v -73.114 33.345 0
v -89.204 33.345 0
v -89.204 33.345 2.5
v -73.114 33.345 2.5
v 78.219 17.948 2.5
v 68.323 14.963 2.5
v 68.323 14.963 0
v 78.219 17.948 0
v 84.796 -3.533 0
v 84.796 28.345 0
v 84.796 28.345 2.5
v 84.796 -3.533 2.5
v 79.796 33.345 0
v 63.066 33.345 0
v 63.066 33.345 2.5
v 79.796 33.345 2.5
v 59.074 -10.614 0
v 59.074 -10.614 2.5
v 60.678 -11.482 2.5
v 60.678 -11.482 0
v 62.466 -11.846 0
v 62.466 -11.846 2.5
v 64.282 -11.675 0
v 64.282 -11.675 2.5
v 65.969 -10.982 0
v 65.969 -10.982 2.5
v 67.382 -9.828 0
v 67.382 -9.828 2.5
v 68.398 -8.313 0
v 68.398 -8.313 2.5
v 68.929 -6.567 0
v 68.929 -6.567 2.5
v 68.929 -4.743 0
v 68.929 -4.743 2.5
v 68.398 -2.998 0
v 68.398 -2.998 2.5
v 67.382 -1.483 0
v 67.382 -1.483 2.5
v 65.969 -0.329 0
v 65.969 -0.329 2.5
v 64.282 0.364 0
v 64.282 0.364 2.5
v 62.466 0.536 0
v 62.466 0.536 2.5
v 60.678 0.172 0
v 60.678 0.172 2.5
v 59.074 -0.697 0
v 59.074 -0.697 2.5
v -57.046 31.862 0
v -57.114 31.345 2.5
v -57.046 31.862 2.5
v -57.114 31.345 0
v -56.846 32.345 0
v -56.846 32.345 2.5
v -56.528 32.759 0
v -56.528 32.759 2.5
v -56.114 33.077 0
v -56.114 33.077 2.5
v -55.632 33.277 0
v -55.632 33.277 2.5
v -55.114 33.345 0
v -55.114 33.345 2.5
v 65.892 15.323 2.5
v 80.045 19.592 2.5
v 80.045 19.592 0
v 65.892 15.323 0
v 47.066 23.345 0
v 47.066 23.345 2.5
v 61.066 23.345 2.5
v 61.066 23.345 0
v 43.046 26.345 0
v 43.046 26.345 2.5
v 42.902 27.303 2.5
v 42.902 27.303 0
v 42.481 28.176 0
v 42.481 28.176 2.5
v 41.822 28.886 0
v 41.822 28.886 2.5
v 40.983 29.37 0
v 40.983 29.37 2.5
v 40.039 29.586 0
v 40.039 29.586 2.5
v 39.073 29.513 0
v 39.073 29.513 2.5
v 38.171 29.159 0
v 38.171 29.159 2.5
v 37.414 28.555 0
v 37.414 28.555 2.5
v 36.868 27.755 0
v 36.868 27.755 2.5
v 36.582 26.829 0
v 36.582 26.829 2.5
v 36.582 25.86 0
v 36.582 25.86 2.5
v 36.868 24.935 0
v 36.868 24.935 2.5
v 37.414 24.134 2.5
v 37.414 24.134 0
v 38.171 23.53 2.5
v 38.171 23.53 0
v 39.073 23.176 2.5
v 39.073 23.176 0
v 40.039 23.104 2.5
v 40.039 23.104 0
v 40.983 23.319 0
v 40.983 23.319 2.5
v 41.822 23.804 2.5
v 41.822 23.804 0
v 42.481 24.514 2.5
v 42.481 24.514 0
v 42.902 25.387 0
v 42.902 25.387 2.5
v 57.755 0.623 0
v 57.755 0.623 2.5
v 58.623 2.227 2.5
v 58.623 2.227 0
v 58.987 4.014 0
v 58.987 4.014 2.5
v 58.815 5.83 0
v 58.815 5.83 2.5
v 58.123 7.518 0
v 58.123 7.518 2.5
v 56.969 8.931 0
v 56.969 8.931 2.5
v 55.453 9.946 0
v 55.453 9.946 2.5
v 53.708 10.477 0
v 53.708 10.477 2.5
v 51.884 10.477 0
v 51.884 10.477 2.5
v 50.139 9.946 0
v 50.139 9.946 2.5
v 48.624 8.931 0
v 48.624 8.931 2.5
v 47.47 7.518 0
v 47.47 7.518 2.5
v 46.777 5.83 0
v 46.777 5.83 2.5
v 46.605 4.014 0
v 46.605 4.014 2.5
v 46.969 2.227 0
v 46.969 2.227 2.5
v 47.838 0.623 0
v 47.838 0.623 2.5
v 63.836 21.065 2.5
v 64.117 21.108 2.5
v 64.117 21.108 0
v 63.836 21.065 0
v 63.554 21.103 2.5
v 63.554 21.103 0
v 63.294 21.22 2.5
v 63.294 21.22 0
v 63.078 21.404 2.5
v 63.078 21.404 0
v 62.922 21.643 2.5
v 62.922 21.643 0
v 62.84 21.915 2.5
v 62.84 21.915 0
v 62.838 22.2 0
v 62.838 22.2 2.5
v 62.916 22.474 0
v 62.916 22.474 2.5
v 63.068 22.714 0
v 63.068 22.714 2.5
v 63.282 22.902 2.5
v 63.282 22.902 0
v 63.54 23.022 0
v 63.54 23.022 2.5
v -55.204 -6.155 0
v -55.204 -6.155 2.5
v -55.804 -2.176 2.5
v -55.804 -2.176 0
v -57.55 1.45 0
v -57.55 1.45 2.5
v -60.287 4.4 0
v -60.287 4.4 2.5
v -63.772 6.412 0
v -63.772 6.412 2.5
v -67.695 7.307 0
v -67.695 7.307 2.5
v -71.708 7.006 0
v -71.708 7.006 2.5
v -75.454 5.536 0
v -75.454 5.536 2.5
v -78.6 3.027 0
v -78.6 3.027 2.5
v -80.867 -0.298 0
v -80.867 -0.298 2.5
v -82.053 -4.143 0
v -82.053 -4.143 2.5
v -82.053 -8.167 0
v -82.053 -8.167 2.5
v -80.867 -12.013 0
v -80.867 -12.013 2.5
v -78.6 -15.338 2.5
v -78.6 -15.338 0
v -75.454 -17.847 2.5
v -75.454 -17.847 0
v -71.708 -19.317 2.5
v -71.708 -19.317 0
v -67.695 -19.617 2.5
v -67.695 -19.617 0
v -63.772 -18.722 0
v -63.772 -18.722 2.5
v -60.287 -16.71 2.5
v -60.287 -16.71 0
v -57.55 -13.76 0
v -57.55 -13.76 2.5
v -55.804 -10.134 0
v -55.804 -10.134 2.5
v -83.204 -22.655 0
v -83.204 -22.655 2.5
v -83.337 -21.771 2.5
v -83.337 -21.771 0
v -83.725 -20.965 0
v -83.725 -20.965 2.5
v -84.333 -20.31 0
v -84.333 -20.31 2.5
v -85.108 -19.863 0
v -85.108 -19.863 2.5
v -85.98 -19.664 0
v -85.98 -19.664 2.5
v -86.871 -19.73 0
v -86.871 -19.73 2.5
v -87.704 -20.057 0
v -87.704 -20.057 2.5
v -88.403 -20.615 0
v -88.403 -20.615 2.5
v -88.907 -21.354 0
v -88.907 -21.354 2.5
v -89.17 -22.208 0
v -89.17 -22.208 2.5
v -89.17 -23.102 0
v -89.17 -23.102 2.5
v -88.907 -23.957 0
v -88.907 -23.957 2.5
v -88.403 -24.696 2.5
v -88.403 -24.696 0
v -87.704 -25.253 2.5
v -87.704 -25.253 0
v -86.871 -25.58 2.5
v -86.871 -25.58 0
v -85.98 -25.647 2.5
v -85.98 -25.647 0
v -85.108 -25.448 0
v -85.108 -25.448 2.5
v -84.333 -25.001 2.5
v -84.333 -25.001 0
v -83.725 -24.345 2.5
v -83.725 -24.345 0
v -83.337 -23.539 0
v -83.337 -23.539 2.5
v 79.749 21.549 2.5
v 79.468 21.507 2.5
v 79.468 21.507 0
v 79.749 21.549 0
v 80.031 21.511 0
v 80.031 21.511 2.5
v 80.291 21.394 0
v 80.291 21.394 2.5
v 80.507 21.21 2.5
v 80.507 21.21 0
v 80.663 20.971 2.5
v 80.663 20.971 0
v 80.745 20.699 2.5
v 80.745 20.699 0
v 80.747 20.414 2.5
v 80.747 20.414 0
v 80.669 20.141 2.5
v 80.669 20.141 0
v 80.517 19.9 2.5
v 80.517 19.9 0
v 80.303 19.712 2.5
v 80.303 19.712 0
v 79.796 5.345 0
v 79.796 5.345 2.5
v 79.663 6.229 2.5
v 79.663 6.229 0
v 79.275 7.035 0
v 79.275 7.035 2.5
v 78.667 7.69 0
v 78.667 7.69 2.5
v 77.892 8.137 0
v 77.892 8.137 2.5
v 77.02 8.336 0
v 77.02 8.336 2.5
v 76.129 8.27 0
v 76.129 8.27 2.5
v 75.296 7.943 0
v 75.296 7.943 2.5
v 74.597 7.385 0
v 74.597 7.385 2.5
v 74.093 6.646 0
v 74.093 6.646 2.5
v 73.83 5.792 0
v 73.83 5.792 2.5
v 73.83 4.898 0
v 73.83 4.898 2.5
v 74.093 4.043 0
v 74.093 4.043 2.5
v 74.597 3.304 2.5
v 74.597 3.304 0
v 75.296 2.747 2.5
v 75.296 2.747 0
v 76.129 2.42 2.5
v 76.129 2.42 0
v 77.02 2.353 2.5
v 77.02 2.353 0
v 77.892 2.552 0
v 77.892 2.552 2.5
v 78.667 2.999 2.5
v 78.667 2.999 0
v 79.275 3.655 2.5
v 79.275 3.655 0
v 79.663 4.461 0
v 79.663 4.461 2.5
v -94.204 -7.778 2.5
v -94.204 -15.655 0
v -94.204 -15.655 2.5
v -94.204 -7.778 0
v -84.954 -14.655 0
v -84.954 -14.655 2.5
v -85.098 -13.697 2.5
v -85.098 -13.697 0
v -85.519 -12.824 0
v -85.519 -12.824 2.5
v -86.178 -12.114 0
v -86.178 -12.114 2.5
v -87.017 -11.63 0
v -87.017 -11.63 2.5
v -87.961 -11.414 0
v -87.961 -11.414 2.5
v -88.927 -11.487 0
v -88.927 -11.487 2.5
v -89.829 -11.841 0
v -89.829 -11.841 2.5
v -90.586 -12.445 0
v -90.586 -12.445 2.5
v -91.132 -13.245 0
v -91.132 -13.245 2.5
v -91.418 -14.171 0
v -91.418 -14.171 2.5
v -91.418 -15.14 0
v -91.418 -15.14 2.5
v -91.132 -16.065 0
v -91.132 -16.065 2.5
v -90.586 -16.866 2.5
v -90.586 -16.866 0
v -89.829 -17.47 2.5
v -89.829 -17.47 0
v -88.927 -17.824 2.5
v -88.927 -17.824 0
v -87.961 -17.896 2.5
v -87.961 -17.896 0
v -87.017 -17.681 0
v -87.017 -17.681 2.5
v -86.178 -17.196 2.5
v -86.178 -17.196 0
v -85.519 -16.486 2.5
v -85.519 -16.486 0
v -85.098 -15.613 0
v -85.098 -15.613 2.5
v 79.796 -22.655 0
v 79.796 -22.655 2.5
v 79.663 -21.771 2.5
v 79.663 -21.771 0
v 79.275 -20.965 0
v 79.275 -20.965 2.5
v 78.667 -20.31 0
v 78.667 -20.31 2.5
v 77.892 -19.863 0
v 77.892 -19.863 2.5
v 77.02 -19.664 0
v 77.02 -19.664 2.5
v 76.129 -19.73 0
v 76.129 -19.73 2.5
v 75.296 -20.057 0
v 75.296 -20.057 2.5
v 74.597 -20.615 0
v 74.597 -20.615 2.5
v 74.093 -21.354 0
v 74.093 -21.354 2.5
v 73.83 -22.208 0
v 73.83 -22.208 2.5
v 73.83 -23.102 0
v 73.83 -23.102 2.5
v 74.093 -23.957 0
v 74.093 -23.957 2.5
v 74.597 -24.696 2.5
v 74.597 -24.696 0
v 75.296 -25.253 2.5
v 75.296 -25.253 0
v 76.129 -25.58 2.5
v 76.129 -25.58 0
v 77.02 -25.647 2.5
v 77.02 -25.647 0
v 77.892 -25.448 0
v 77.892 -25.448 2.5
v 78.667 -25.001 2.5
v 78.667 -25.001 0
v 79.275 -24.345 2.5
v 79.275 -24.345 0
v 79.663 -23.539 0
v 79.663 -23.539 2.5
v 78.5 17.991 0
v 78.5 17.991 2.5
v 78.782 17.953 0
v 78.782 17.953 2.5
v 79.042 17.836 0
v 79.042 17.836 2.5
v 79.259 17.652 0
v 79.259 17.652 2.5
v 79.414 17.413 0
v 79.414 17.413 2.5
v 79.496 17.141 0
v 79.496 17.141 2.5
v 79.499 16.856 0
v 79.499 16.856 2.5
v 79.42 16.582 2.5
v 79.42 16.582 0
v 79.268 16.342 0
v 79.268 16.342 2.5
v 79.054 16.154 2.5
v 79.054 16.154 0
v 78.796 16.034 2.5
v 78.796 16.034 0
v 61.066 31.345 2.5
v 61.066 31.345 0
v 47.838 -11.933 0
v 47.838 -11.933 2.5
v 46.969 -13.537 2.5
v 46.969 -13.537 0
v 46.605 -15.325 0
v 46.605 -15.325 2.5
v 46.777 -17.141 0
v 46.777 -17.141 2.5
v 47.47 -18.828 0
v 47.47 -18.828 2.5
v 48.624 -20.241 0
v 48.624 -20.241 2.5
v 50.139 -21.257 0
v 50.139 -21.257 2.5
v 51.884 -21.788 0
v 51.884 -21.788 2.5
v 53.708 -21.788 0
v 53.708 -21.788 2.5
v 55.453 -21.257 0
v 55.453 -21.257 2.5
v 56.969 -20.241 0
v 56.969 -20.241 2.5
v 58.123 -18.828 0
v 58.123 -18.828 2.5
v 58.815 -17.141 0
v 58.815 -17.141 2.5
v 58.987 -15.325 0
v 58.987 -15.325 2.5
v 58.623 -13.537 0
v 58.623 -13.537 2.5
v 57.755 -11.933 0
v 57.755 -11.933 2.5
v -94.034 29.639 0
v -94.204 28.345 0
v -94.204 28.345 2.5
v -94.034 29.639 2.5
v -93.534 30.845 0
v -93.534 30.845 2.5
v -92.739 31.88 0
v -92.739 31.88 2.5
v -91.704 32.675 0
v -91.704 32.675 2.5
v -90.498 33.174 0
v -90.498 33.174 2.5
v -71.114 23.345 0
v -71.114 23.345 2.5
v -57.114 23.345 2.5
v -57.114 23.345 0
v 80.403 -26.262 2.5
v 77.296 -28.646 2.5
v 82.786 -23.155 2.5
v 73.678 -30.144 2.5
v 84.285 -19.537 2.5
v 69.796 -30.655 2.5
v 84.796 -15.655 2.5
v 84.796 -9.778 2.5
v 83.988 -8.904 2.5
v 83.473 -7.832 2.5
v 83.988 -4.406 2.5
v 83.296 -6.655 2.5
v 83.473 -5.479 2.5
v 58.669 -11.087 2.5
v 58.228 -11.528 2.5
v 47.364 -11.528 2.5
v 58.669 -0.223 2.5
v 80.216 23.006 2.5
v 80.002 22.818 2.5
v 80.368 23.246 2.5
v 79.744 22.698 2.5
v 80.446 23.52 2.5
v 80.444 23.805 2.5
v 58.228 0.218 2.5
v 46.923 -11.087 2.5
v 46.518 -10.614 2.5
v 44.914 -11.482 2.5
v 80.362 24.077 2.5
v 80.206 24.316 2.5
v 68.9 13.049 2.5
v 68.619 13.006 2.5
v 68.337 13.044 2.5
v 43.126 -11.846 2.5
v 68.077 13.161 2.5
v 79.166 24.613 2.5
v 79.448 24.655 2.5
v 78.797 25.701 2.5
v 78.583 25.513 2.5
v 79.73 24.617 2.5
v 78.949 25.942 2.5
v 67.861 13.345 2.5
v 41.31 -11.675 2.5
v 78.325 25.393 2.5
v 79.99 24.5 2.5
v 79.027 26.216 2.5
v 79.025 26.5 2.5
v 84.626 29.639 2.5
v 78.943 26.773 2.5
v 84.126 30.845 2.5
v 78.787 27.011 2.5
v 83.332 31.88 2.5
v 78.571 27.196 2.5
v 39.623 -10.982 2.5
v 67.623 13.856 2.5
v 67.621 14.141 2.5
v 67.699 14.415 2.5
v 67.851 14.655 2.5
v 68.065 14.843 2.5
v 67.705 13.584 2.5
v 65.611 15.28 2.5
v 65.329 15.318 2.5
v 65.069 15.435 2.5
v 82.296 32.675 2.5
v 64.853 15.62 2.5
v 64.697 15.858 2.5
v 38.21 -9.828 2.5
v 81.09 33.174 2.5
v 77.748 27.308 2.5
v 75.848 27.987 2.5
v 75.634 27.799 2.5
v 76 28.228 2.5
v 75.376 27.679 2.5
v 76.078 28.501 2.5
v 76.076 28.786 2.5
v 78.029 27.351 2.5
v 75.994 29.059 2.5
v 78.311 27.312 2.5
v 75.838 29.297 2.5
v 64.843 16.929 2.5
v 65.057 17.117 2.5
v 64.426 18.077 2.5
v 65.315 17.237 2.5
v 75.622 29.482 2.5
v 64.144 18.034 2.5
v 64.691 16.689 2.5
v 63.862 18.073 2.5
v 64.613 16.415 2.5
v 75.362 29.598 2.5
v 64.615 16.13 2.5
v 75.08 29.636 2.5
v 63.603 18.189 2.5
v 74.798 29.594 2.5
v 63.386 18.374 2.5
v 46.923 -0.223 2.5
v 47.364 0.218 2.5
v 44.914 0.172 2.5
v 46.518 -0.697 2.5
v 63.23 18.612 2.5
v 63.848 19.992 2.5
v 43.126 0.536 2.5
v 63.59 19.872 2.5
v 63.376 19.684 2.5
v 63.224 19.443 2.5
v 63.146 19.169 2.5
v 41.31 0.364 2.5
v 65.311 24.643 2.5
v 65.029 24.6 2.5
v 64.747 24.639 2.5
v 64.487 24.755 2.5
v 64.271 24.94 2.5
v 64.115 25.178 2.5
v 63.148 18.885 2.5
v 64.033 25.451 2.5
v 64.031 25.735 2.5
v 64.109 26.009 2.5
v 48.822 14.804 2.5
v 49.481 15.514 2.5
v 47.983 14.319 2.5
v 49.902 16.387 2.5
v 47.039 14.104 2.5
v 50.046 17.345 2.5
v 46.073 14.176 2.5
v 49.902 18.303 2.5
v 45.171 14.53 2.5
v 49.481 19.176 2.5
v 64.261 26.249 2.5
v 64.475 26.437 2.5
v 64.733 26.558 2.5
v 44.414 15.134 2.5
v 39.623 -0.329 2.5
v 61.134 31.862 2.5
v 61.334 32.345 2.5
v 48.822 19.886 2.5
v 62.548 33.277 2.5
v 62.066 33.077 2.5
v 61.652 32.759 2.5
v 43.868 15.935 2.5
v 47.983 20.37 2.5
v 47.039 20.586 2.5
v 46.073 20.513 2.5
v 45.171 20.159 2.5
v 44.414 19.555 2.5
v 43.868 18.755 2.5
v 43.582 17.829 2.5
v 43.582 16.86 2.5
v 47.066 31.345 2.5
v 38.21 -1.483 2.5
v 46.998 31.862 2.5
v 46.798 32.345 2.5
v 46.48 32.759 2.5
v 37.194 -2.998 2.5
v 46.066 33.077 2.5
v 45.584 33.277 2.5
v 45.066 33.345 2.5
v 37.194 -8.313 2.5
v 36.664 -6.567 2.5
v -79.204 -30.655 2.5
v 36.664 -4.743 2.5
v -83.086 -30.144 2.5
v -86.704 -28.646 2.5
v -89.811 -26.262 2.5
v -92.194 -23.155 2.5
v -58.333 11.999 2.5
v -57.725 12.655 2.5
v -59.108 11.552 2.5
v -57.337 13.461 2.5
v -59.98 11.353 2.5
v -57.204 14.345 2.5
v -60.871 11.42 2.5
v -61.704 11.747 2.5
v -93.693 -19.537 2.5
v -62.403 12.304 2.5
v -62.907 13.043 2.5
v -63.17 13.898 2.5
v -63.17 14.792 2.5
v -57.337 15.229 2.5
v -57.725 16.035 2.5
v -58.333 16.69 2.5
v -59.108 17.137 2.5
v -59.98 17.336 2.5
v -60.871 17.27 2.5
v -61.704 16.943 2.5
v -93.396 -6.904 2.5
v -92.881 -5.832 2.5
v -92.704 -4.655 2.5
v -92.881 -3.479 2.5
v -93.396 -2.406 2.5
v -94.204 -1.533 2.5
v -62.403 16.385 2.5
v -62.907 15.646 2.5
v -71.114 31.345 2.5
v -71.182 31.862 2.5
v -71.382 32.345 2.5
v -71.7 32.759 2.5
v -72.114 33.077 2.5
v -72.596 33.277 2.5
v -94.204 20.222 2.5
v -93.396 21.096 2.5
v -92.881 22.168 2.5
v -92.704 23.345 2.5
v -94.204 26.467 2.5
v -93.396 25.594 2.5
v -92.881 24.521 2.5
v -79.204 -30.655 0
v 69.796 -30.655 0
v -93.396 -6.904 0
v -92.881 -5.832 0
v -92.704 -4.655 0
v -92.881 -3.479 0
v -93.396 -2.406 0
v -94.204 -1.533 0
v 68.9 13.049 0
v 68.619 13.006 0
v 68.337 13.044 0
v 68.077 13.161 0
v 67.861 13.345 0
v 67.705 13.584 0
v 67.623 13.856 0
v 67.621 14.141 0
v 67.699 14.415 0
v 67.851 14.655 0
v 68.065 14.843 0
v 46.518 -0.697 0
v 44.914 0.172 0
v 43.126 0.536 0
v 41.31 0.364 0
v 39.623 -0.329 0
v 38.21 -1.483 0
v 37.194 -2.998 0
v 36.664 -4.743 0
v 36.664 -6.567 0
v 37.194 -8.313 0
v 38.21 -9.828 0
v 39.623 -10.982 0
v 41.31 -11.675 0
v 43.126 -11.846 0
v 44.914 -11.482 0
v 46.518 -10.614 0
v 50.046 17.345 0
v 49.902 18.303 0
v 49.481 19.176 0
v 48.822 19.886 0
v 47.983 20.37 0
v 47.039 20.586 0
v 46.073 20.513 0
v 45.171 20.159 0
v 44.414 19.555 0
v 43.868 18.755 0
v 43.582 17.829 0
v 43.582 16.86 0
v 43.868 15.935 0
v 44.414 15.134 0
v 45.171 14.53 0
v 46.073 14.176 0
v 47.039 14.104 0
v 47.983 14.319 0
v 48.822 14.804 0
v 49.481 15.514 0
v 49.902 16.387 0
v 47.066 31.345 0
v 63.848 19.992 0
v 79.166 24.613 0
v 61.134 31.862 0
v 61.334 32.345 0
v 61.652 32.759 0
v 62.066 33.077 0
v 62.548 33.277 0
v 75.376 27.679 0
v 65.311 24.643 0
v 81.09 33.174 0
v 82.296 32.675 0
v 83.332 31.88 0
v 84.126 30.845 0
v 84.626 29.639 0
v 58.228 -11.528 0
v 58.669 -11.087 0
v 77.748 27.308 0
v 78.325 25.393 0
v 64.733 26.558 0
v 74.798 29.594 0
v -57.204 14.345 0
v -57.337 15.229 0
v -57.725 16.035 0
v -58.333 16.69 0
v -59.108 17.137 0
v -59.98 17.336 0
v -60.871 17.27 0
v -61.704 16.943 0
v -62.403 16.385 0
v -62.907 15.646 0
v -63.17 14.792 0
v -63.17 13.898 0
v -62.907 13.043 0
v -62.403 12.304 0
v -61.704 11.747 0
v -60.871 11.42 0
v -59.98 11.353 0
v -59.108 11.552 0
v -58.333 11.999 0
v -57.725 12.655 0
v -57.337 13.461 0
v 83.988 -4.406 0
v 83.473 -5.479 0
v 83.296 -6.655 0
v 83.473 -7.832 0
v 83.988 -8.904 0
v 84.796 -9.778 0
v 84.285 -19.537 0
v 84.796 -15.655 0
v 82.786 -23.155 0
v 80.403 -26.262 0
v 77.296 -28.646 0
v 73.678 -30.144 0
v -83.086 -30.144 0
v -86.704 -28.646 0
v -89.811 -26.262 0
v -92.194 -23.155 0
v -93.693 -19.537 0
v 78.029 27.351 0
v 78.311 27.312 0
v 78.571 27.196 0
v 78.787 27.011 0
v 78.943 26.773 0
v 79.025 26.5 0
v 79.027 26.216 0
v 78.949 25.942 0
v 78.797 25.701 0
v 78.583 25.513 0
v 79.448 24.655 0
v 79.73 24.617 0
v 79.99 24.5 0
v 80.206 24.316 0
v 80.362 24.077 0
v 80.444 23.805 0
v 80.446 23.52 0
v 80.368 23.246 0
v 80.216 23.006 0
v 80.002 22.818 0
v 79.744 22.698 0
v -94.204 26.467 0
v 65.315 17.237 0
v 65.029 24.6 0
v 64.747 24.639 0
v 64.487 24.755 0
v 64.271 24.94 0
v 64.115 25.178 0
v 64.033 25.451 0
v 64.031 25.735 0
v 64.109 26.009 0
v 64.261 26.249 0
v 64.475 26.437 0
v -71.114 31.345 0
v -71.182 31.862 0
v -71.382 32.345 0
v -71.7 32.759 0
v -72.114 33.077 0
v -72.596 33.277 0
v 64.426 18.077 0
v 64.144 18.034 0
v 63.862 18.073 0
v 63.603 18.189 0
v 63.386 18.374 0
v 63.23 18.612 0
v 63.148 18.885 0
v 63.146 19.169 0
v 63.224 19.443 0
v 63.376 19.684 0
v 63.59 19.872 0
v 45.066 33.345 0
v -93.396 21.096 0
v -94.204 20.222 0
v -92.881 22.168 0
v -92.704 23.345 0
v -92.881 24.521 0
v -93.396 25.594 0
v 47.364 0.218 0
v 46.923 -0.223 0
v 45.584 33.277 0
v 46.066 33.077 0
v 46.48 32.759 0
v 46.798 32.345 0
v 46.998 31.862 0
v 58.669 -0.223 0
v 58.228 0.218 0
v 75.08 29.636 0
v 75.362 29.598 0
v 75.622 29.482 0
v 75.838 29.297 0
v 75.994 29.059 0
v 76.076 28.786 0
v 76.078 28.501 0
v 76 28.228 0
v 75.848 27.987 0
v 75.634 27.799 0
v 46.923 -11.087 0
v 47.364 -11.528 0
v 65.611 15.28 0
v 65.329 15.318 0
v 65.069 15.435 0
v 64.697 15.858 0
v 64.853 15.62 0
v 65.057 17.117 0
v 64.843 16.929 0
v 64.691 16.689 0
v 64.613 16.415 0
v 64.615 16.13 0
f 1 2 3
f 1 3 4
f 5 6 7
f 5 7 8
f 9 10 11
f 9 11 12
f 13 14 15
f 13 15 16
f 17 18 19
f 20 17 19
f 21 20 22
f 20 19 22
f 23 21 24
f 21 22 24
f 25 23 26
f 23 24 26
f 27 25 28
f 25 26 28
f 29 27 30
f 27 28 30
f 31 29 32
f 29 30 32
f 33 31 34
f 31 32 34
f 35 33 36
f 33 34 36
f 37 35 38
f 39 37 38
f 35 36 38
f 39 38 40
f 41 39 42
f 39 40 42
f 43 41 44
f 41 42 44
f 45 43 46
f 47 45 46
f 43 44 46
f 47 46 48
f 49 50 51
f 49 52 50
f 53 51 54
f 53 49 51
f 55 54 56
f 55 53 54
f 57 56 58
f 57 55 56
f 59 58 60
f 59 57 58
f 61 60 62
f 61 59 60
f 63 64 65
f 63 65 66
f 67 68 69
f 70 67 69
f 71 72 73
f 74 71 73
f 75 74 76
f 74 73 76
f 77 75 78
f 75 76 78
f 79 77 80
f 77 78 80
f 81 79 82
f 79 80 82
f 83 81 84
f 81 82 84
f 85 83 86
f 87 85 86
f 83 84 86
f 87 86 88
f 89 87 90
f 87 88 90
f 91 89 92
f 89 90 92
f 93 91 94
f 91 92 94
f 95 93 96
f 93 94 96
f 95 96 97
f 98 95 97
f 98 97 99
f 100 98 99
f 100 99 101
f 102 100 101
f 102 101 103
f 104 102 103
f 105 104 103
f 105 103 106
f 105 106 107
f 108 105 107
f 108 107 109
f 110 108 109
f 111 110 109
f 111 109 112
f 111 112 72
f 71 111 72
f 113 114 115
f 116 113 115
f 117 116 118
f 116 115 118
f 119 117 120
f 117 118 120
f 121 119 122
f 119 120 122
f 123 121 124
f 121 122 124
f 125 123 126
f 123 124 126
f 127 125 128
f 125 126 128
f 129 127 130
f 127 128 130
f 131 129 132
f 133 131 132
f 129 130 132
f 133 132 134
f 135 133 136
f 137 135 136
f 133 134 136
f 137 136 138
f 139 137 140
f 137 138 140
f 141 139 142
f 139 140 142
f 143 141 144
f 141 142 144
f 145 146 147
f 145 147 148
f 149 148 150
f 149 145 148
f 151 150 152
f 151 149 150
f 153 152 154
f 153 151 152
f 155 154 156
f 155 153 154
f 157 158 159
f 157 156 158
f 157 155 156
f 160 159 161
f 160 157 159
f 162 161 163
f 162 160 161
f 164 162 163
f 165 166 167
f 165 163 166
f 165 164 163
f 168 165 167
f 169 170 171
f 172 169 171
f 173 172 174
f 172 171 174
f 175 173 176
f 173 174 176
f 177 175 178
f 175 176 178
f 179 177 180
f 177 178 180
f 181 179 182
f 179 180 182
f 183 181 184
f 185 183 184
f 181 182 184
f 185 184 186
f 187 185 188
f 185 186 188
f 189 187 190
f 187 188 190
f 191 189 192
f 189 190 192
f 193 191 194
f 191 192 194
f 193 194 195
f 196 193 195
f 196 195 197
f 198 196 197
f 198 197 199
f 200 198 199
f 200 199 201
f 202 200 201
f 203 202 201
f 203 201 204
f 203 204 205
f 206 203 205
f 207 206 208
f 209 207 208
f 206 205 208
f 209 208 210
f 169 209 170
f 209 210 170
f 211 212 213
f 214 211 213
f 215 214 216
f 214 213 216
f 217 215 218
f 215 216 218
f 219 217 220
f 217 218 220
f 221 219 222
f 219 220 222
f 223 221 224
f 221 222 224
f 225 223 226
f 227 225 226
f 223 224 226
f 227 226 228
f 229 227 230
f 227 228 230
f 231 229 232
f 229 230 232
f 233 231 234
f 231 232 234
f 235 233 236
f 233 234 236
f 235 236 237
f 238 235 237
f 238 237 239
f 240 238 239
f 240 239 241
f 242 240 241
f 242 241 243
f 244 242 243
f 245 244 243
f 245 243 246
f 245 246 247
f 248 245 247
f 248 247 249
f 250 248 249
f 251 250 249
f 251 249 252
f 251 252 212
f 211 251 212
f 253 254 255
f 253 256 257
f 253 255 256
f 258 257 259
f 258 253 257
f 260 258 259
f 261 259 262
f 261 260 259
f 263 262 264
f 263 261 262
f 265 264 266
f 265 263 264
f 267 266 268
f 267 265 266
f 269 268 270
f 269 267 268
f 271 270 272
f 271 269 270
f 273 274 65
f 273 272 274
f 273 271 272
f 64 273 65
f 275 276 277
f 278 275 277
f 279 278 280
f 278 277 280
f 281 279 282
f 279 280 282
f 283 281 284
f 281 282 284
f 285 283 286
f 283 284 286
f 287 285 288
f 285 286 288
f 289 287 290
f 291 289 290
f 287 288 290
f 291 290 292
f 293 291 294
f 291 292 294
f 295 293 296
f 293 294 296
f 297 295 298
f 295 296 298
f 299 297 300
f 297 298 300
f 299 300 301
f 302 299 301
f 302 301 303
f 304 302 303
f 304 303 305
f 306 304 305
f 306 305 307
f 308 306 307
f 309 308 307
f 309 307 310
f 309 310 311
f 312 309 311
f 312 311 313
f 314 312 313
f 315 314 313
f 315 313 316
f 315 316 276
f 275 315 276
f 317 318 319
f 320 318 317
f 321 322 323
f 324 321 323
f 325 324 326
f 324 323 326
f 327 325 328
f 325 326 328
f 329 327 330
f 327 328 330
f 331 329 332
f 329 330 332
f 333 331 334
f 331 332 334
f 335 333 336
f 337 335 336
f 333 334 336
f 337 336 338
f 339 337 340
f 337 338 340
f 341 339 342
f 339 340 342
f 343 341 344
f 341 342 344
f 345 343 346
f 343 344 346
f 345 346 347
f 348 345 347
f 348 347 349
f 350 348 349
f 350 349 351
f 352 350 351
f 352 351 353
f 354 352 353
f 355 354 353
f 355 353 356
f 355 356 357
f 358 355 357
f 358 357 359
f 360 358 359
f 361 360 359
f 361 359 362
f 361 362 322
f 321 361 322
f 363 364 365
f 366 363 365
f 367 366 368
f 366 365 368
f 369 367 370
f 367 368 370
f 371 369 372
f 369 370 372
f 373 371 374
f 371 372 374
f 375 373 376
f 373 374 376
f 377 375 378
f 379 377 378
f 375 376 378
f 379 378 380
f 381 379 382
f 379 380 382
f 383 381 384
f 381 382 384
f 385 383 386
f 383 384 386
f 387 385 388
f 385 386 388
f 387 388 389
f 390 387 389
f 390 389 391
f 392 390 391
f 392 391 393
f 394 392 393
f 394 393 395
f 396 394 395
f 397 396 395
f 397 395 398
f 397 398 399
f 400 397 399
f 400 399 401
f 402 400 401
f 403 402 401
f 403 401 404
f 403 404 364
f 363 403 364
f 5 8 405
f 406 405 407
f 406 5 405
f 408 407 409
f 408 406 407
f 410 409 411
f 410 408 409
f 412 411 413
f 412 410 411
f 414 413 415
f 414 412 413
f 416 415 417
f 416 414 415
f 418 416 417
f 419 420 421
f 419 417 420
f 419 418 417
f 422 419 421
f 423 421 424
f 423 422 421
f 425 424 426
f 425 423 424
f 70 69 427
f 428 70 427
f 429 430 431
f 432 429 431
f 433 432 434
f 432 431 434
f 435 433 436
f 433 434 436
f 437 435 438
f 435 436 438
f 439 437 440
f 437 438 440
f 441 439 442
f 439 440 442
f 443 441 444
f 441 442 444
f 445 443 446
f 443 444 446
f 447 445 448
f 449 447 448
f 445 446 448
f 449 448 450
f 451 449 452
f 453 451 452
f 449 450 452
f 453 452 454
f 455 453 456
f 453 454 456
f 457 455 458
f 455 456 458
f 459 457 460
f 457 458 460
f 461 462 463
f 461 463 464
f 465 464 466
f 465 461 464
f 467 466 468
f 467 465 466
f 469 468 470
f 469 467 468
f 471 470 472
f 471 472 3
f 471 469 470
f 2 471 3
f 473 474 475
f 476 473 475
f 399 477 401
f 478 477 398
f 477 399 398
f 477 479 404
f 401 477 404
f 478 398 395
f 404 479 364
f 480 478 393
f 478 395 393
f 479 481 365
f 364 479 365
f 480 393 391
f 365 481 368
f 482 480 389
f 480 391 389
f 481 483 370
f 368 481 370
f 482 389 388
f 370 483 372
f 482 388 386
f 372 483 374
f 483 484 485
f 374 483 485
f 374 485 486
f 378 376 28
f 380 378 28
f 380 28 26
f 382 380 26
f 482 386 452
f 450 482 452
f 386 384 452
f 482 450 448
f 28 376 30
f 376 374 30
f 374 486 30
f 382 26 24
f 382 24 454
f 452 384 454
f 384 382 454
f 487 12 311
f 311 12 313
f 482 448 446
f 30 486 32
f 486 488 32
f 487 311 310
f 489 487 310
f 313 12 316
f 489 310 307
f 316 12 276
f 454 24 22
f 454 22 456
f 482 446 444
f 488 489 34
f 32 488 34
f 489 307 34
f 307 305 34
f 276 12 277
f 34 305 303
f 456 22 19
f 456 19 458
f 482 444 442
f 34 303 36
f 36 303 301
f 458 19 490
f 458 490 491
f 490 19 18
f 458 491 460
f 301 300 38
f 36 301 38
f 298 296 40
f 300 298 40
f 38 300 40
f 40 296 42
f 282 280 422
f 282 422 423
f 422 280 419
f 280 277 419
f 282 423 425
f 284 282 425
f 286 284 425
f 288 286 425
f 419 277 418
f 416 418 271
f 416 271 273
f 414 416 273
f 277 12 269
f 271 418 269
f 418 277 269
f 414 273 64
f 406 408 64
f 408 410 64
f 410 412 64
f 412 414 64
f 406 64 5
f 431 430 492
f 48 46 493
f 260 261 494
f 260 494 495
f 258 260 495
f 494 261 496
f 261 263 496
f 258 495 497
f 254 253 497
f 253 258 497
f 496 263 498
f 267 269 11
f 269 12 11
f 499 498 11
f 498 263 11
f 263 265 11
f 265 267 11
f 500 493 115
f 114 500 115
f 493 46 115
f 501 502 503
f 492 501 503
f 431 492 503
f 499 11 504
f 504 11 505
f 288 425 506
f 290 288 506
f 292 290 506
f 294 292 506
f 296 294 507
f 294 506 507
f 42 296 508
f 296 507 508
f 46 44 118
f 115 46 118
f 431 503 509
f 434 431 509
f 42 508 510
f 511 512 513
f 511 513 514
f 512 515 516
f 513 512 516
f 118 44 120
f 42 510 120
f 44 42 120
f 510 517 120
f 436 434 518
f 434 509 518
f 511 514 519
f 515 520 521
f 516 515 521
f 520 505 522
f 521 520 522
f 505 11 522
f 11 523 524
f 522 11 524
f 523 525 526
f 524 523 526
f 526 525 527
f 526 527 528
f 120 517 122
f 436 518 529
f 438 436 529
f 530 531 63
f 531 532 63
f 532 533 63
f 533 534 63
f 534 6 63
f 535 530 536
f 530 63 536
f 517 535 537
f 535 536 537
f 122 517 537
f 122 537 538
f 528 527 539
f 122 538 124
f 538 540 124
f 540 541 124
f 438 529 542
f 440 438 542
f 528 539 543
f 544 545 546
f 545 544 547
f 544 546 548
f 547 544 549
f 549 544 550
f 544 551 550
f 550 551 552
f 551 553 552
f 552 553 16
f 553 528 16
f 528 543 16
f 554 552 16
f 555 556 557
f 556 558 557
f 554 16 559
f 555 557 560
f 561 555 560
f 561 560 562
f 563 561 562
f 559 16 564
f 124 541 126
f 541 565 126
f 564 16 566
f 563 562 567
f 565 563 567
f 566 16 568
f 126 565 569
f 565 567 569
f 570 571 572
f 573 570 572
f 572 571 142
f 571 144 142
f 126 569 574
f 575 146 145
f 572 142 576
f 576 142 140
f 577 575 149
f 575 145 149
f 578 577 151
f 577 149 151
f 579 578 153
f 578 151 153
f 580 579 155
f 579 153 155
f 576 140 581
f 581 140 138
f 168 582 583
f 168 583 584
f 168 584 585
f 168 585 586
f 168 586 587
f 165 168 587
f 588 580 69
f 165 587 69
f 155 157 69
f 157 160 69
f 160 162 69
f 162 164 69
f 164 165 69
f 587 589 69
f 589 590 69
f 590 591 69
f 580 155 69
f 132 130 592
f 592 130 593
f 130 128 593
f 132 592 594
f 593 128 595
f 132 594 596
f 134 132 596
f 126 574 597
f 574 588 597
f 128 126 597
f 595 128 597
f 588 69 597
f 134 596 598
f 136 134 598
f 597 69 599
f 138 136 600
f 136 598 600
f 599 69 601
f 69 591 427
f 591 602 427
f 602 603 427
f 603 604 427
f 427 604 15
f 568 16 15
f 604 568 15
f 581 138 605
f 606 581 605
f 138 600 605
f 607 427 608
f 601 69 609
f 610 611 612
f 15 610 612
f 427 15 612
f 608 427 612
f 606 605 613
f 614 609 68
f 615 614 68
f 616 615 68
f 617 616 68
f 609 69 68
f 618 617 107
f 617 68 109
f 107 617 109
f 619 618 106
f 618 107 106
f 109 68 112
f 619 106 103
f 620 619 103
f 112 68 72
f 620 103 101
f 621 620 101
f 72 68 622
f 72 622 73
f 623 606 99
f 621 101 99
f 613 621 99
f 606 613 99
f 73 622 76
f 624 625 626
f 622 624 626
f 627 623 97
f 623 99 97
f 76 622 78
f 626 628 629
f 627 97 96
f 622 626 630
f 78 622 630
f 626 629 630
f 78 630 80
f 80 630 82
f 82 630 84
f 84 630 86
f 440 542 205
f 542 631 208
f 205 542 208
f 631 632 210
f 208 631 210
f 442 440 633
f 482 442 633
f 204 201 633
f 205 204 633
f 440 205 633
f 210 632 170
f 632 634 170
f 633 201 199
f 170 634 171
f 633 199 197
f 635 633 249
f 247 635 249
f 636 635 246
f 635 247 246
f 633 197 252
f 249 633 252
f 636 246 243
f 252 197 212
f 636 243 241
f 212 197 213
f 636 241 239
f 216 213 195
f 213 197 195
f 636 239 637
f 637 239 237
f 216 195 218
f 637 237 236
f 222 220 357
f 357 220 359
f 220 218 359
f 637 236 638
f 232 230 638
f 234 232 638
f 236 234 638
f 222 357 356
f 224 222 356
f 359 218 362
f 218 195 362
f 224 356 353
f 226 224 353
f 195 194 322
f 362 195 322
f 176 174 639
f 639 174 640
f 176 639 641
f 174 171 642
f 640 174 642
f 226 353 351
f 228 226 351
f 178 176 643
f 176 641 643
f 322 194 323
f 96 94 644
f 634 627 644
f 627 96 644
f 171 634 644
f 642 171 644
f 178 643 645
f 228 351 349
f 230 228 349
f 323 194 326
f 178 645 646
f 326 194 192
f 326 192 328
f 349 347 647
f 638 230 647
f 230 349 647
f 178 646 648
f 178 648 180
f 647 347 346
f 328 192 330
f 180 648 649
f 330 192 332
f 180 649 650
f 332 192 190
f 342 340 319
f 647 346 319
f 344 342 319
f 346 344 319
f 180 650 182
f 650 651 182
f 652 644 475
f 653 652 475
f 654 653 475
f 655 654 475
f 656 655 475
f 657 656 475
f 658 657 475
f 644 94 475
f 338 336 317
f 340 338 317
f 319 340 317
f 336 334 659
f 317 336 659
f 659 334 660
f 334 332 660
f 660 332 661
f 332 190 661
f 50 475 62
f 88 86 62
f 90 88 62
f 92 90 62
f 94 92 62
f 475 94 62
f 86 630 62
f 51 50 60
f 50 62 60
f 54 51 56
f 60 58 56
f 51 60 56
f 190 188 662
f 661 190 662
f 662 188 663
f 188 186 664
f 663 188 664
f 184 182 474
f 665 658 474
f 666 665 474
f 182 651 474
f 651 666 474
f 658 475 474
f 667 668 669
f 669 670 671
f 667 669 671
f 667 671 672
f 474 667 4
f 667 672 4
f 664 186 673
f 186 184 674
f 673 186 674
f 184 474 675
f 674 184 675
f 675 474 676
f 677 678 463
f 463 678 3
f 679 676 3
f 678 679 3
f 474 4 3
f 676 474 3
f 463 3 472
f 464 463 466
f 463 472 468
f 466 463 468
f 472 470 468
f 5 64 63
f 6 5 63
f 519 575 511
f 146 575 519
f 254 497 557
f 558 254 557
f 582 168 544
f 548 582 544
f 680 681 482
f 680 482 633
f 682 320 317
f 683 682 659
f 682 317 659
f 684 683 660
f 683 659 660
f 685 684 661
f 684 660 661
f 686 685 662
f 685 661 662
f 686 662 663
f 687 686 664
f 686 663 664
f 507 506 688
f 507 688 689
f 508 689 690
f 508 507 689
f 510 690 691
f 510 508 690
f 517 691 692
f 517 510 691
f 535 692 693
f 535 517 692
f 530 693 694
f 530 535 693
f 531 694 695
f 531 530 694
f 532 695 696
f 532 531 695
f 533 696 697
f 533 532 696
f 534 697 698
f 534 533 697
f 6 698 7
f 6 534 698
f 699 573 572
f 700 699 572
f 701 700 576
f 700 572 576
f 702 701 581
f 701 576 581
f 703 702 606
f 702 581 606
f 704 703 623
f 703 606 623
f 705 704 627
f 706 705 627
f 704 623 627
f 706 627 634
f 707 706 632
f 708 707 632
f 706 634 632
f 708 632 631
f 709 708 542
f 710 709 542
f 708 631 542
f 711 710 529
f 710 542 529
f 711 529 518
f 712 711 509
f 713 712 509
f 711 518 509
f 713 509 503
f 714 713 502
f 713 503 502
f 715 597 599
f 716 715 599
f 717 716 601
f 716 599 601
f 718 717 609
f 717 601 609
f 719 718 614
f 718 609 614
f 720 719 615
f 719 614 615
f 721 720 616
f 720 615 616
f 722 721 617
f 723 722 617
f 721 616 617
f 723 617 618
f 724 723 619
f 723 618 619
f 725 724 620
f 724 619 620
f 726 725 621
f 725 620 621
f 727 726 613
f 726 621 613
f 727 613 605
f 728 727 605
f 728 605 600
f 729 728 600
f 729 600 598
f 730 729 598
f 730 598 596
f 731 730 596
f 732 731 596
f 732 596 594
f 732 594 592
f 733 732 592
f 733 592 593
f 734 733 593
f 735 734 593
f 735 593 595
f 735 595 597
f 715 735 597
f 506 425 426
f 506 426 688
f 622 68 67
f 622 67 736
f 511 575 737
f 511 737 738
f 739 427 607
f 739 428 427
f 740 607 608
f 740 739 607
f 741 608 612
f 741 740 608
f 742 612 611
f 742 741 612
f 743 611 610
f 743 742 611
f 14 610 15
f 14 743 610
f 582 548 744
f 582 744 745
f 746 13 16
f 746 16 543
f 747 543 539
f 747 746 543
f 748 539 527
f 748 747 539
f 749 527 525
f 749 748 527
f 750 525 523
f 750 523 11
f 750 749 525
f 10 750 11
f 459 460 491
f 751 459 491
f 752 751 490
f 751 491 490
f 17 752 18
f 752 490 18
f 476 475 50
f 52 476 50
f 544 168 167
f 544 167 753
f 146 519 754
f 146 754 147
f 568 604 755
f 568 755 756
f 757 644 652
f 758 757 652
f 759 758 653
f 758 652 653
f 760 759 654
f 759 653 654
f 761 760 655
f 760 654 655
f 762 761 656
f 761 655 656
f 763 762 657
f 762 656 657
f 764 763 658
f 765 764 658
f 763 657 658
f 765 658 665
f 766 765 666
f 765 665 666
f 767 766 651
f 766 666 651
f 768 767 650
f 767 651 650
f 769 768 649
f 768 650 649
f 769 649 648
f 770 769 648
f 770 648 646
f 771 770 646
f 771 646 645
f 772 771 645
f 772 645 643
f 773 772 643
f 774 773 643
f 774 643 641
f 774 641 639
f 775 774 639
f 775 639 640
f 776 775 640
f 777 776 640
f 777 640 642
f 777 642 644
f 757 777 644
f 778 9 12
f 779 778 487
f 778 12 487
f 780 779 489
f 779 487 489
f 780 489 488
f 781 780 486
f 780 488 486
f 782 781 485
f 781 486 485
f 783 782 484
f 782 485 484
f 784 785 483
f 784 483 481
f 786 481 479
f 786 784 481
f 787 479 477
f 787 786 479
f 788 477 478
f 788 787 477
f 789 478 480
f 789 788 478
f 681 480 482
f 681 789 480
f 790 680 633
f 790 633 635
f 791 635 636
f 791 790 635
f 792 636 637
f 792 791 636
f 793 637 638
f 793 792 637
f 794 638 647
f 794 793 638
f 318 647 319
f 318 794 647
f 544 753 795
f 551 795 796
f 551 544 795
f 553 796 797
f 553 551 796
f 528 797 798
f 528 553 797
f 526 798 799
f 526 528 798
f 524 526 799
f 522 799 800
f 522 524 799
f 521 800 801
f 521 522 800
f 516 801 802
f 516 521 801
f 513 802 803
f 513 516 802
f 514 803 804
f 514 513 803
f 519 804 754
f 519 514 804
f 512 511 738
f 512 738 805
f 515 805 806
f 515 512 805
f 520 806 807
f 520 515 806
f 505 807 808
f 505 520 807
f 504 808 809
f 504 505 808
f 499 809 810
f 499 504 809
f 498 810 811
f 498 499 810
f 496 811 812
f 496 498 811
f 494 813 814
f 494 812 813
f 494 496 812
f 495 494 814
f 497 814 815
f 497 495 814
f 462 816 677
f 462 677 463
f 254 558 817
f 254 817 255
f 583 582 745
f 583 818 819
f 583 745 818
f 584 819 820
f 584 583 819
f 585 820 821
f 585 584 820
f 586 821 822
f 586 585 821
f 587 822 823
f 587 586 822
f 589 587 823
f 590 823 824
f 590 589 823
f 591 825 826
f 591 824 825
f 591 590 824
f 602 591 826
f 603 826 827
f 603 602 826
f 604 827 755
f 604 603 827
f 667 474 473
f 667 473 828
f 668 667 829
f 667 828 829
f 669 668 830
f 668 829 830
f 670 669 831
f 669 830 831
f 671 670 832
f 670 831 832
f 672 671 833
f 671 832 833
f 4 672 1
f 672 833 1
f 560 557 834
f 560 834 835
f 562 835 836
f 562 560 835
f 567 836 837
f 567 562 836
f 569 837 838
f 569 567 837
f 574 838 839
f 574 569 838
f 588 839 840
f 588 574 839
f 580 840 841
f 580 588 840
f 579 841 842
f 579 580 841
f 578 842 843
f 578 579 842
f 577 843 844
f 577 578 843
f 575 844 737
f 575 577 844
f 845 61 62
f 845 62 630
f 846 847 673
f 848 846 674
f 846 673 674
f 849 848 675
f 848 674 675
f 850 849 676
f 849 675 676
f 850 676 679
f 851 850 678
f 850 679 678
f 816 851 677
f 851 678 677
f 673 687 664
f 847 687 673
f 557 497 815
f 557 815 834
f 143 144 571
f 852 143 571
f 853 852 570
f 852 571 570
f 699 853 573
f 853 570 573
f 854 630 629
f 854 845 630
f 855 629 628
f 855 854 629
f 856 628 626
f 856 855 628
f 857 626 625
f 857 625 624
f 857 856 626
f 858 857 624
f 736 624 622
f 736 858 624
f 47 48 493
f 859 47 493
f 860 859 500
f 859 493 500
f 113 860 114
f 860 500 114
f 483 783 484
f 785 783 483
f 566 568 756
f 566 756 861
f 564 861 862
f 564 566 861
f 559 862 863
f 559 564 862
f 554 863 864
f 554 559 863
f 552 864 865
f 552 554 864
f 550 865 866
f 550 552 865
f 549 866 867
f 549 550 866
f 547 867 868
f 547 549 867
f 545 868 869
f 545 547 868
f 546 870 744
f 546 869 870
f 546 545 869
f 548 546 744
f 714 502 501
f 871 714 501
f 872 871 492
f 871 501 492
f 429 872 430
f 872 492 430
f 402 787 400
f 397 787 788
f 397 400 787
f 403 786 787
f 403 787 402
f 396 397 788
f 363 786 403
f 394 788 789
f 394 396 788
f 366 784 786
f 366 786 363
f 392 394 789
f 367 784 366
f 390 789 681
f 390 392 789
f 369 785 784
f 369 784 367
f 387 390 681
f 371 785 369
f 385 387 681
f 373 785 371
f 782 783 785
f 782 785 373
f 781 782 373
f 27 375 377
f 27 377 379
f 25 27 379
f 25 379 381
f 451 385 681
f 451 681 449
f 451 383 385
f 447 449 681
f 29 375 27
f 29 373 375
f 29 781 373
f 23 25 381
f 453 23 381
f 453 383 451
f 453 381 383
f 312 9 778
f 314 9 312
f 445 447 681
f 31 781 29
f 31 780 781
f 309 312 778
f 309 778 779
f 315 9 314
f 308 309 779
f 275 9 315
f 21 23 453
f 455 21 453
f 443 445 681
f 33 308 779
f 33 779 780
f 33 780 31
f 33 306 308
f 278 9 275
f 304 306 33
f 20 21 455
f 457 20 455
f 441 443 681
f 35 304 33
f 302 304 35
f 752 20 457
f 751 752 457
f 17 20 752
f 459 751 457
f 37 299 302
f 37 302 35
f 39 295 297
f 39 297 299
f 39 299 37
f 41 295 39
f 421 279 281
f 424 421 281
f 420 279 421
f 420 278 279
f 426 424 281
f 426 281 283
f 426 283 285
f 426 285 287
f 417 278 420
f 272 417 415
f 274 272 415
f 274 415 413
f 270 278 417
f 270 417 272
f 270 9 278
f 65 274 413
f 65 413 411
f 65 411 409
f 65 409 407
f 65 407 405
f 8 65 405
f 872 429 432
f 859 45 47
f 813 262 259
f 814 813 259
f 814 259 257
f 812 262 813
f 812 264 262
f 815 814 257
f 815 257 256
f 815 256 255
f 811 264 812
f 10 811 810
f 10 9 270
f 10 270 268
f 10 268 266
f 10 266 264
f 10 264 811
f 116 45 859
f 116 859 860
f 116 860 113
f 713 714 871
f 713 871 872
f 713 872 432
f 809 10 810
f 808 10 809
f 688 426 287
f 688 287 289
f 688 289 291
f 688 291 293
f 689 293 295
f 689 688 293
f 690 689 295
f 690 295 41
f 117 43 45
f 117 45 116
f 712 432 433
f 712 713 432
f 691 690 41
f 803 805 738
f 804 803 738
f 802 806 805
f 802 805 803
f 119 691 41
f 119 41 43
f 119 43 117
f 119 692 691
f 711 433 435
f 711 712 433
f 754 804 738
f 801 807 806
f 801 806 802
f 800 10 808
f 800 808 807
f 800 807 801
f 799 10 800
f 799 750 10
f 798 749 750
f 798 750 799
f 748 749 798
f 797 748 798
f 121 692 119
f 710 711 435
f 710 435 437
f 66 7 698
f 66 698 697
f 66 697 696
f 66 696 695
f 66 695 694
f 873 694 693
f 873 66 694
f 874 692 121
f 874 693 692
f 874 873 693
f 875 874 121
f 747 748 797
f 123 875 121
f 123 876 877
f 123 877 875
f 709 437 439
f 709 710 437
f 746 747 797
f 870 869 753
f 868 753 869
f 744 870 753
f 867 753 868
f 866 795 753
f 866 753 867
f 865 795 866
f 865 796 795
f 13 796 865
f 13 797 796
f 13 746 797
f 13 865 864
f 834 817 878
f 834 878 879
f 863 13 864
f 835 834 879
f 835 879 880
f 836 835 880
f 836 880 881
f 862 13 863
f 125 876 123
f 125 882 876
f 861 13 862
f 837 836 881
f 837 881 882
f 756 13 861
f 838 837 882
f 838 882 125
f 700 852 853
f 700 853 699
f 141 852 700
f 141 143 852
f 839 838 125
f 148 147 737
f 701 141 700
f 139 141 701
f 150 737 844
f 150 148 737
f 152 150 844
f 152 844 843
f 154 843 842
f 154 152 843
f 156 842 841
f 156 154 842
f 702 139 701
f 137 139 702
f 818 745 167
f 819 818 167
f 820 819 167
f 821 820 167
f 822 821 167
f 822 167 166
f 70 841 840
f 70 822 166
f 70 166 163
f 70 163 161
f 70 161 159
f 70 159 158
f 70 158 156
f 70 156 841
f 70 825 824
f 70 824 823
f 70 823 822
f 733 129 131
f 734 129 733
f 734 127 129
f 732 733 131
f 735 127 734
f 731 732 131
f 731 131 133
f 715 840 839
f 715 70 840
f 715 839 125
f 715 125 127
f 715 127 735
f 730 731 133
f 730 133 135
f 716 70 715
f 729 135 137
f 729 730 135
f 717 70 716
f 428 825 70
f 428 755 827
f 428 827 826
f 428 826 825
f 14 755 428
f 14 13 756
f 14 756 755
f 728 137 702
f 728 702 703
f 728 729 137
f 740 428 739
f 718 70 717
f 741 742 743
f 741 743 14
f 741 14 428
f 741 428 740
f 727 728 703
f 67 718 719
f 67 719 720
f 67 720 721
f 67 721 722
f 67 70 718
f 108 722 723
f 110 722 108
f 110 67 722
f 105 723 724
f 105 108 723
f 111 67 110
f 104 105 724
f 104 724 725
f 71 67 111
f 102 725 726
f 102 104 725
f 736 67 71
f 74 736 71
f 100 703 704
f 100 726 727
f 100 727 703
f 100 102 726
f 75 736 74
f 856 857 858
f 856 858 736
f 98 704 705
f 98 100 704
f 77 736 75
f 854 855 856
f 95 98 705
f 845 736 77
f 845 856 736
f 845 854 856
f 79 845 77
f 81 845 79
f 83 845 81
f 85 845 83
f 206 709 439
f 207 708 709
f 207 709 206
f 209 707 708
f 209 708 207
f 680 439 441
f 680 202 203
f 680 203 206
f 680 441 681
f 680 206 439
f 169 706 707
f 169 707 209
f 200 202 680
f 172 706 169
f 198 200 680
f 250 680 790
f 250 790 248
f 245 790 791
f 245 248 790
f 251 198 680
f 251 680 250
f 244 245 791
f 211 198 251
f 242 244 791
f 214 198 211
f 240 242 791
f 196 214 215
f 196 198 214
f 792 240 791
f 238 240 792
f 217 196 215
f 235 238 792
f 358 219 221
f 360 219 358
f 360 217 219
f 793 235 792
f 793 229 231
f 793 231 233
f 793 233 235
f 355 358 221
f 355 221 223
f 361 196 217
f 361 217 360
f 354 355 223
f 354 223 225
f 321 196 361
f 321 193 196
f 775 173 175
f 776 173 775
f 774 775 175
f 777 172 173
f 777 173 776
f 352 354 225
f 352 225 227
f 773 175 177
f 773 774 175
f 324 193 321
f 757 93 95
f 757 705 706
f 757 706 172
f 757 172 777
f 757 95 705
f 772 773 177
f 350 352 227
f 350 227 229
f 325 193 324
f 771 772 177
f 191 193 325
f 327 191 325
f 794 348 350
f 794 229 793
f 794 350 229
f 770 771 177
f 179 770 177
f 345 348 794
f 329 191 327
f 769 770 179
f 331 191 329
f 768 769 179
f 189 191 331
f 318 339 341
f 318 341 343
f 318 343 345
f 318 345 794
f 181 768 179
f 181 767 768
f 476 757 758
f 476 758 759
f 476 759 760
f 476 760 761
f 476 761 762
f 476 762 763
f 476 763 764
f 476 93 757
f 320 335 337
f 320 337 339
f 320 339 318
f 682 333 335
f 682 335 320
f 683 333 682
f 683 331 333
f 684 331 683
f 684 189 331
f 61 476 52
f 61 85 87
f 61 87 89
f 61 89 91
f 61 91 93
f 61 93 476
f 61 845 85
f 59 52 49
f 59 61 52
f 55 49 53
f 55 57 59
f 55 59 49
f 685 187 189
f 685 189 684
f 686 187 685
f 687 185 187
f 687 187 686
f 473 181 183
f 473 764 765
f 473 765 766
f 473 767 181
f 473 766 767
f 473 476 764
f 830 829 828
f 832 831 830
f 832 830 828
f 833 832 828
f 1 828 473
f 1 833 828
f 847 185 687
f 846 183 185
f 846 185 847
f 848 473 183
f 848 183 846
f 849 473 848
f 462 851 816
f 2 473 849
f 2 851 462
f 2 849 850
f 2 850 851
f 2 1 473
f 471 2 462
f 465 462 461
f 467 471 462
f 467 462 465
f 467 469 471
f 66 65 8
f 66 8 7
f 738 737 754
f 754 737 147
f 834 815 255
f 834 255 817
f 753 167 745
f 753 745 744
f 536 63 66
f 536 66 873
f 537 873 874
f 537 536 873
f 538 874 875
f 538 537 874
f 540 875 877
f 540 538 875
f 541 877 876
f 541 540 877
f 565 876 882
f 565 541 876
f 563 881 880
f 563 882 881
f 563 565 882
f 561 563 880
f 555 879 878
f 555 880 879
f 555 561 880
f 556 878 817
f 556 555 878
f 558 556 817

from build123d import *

# Parameters (mm, degrees)
BOSS_EXTRU_1_DEPTH       = 2.5
JOYSTICK_R               = 13.5
ENL_V_MAT_EXTRU_2_DEPTH  = 2.5
ESQUISSE2_W              = 14
ESQUISSE2_H              = 10
ENL_V_MAT_EXTRU_3_DEPTH  = 10
CONG_1_R                 = 2
CONG_2_R                 = 2
ESQUISSE3_W              = 14
ESQUISSE3_H              = 10
ENL_V_MAT_EXTRU_4_DEPTH  = 10
CONG_3_R                 = 2
CONG_4_R                 = 2
F_12X12_BUTTON_R         = 6.2
ENL_V_MAT_EXTRU_5_DEPTH  = 10
ENL_V_MAT_EXTRU_8_DEPTH  = 10
ESQUISSE5_R              = 3
ESQUISSE5_R_2            = 3.25
ENL_V_MAT_EXTRU_9_DEPTH  = 10
ESQUISSE6_R              = 4
ENL_V_MAT_EXTRU_11_DEPTH = 10


with BuildPart() as part:
    # Esquisse1 → Boss.-Extru.1 (new body)
    with BuildSketch(Plane.XY):
        with BuildLine():
            Line((-89.203921136, 33.34478673), (79.796078864, 33.34478673))
            ThreePointArc((79.796078864, 33.34478673), (83.33161277, 31.880320636), (84.796078864, 28.34478673))
            Line((84.796078864, 28.34478673), (84.796078864, -15.65521327))
            ThreePointArc((84.796078864, -15.65521327), (80.402680581, -26.261814988), (69.796078864, -30.65521327))
            Line((69.796078864, -30.65521327), (-79.203921136, -30.65521327))
            ThreePointArc((-79.203921136, -30.65521327), (-89.810522854, -26.261814988), (-94.203921136, -15.65521327))
            Line((-94.203921136, -15.65521327), (-94.203921136, 28.34478673))
            ThreePointArc((-94.203921136, 28.34478673), (-92.739455042, 31.880320636), (-89.203921136, 33.34478673))
        make_face()
    extrude(amount=BOSS_EXTRU_1_DEPTH)

    # Joystick → Enlèv. mat.-Extru.2 (cut)
    with BuildSketch(Plane.XY.offset(2.5)):
        with Locations((-68.703921136, -6.15521327)):
            Circle(JOYSTICK_R)
    extrude(amount=-ENL_V_MAT_EXTRU_2_DEPTH, mode=Mode.SUBTRACT)

    # Esquisse2 → Enlèv. mat.-Extru.3 (cut)
    with BuildSketch(Plane.XY.offset(2.5)):
        with Locations((54.066078864, 28.34478673)):
            Rectangle(ESQUISSE2_W, ESQUISSE2_H)
    extrude(amount=-ENL_V_MAT_EXTRU_3_DEPTH, mode=Mode.SUBTRACT)

    # Congé1
    cong_1_edges = [part.edges().sort_by_distance(p)[0] for p in [
        (47.066078864, 33.34478673, 1.25),
    ]]
    fillet(cong_1_edges, radius=CONG_1_R)

    # Congé2
    cong_2_edges = [part.edges().sort_by_distance(p)[0] for p in [
        (61.066078864, 33.34478673, 1.25),
    ]]
    fillet(cong_2_edges, radius=CONG_2_R)

    # Esquisse3 → Enlèv. mat.-Extru.4 (cut)
    with BuildSketch(Plane.XY.offset(2.5)):
        with Locations((-64.113921136, 28.34478673)):
            Rectangle(ESQUISSE3_W, ESQUISSE3_H)
    extrude(amount=-ENL_V_MAT_EXTRU_4_DEPTH, mode=Mode.SUBTRACT)

    # Congé3
    cong_3_edges = [part.edges().sort_by_distance(p)[0] for p in [
        (-71.113921136, 33.34478673, 1.25),
    ]]
    fillet(cong_3_edges, radius=CONG_3_R)

    # Congé4
    cong_4_edges = [part.edges().sort_by_distance(p)[0] for p in [
        (-57.113921136, 33.34478673, 1.25),
    ]]
    fillet(cong_4_edges, radius=CONG_4_R)

    # 12x12 Button → Enlèv. mat.-Extru.5 (cut)
    with BuildSketch(Plane.XY.offset(2.5)):
        with BuildLine():
            ThreePointArc((46.518078864, -0.6967139), (48.342086437, -2.883607238), (48.996078864, -5.65521327))
            ThreePointArc((48.996078864, -5.65521327), (48.342086437, -8.426819303), (46.518078864, -10.61371264))
            ThreePointArc((46.518078864, -10.61371264), (47.139224614, -11.31206752), (47.837579494, -11.93321327))
            ThreePointArc((47.837579494, -11.93321327), (52.796078864, -9.45521327), (57.754578233, -11.93321327))
            ThreePointArc((57.754578233, -11.93321327), (58.452933113, -11.31206752), (59.074078864, -10.61371264))
            ThreePointArc((59.074078864, -10.61371264), (56.596078864, -5.65521327), (59.074078864, -0.6967139))
            ThreePointArc((59.074078864, -0.6967139), (58.452933113, 0.001640979), (57.754578233, 0.62278673))
            ThreePointArc((57.754578233, 0.62278673), (52.796078864, -1.85521327), (47.837579494, 0.62278673))
            ThreePointArc((47.837579494, 0.62278673), (47.139224614, 0.001640979), (46.518078864, -0.6967139))
        make_face()
        with Locations((42.796078864, -5.65521327)):
            Circle(F_12X12_BUTTON_R)
        with Locations((52.796078864, 4.34478673)):
            Circle(F_12X12_BUTTON_R)
        with Locations((62.796078864, -5.65521327)):
            Circle(F_12X12_BUTTON_R)
        with Locations((52.796078864, -15.65521327)):
            Circle(F_12X12_BUTTON_R)
    extrude(amount=-ENL_V_MAT_EXTRU_5_DEPTH, mode=Mode.SUBTRACT)

    # Esquisse4 → Enlèv. mat.-Extru.8 (cut)
    with BuildSketch(Plane.XY.offset(2.5)):
        with BuildLine():
            Line((63.848163441, 19.991775112), (79.166394029, 24.612577171))
            ThreePointArc((79.166394029, 24.612577171), (80.412583569, 23.943987888), (79.743994286, 22.697798347))
            Line((79.743994286, 22.697798347), (64.425763698, 18.076996289))
            ThreePointArc((64.425763698, 18.076996289), (63.179574158, 18.745585572), (63.848163441, 19.991775112))
        make_face()
        with BuildLine():
            Line((63.539756046, 23.02230266), (77.747509179, 27.308125004))
            ThreePointArc((77.747509179, 27.308125004), (78.993698719, 26.639535721), (78.325109436, 25.39334618))
            Line((78.325109436, 25.39334618), (64.117356303, 21.107523836))
            ThreePointArc((64.117356303, 21.107523836), (62.871166763, 21.776113119), (63.539756046, 23.02230266))
        make_face()
        with BuildLine():
            Line((64.732924902, 26.557541009), (74.798428352, 29.593838105))
            ThreePointArc((74.798428352, 29.593838105), (76.044617893, 28.925248822), (75.37602861, 27.679059282))
            Line((75.37602861, 27.679059282), (65.31052516, 24.642762185))
            ThreePointArc((65.31052516, 24.642762185), (64.064335619, 25.311351468), (64.732924902, 26.557541009))
        make_face()
        with BuildLine():
            Line((65.314724126, 17.237366416), (79.467627817, 21.506643219))
            ThreePointArc((79.467627817, 21.506643219), (80.713811222, 20.838057228), (80.04522523, 19.591873823))
            Line((80.04522523, 19.591873823), (65.89232154, 15.32259702))
            ThreePointArc((65.89232154, 15.32259702), (64.646138135, 15.991183011), (65.314724126, 17.237366416))
        make_face()
        with BuildLine():
            Line((68.322797362, 14.963301678), (78.218865725, 17.948488042))
            ThreePointArc((78.218865725, 17.948488042), (79.465055266, 17.279898759), (78.796465983, 16.033709218))
            Line((78.796465983, 16.033709218), (68.900397619, 13.048522855))
            ThreePointArc((68.900397619, 13.048522855), (67.654208079, 13.717112138), (68.322797362, 14.963301678))
        make_face()
    extrude(amount=-ENL_V_MAT_EXTRU_8_DEPTH, mode=Mode.SUBTRACT)

    # Esquisse5 → Enlèv. mat.-Extru.9 (cut)
    with BuildSketch(Plane.XY.offset(2.5)):
        with Locations((76.796078864, -22.65521327)):
            Circle(ESQUISSE5_R)
        with Locations((-86.203921136, -22.65521327)):
            Circle(ESQUISSE5_R)
        with Locations((76.796078864, 5.34478673)):
            Circle(ESQUISSE5_R)
        with Locations((-60.203921136, 14.34478673)):
            Circle(ESQUISSE5_R)
        with Locations((-88.203921136, -14.65521327)):
            Circle(ESQUISSE5_R_2)
        with Locations((39.796078864, 26.34478673)):
            Circle(ESQUISSE5_R_2)
        with Locations((46.796078864, 17.34478673)):
            Circle(ESQUISSE5_R_2)
    extrude(amount=-ENL_V_MAT_EXTRU_9_DEPTH, mode=Mode.SUBTRACT)

    # Esquisse6 → Enlèv. mat.-Extru.11 (cut)
    with BuildSketch(Plane.XY.offset(2.5)):
        with Locations((-96.703921136, -4.65521327)):
            Circle(ESQUISSE6_R)
        with Locations((-96.703921136, 23.34478673)):
            Circle(ESQUISSE6_R)
        with Locations((87.296078864, -6.65521327)):
            Circle(ESQUISSE6_R)
    extrude(amount=-ENL_V_MAT_EXTRU_11_DEPTH, mode=Mode.SUBTRACT)


solid = part.part
